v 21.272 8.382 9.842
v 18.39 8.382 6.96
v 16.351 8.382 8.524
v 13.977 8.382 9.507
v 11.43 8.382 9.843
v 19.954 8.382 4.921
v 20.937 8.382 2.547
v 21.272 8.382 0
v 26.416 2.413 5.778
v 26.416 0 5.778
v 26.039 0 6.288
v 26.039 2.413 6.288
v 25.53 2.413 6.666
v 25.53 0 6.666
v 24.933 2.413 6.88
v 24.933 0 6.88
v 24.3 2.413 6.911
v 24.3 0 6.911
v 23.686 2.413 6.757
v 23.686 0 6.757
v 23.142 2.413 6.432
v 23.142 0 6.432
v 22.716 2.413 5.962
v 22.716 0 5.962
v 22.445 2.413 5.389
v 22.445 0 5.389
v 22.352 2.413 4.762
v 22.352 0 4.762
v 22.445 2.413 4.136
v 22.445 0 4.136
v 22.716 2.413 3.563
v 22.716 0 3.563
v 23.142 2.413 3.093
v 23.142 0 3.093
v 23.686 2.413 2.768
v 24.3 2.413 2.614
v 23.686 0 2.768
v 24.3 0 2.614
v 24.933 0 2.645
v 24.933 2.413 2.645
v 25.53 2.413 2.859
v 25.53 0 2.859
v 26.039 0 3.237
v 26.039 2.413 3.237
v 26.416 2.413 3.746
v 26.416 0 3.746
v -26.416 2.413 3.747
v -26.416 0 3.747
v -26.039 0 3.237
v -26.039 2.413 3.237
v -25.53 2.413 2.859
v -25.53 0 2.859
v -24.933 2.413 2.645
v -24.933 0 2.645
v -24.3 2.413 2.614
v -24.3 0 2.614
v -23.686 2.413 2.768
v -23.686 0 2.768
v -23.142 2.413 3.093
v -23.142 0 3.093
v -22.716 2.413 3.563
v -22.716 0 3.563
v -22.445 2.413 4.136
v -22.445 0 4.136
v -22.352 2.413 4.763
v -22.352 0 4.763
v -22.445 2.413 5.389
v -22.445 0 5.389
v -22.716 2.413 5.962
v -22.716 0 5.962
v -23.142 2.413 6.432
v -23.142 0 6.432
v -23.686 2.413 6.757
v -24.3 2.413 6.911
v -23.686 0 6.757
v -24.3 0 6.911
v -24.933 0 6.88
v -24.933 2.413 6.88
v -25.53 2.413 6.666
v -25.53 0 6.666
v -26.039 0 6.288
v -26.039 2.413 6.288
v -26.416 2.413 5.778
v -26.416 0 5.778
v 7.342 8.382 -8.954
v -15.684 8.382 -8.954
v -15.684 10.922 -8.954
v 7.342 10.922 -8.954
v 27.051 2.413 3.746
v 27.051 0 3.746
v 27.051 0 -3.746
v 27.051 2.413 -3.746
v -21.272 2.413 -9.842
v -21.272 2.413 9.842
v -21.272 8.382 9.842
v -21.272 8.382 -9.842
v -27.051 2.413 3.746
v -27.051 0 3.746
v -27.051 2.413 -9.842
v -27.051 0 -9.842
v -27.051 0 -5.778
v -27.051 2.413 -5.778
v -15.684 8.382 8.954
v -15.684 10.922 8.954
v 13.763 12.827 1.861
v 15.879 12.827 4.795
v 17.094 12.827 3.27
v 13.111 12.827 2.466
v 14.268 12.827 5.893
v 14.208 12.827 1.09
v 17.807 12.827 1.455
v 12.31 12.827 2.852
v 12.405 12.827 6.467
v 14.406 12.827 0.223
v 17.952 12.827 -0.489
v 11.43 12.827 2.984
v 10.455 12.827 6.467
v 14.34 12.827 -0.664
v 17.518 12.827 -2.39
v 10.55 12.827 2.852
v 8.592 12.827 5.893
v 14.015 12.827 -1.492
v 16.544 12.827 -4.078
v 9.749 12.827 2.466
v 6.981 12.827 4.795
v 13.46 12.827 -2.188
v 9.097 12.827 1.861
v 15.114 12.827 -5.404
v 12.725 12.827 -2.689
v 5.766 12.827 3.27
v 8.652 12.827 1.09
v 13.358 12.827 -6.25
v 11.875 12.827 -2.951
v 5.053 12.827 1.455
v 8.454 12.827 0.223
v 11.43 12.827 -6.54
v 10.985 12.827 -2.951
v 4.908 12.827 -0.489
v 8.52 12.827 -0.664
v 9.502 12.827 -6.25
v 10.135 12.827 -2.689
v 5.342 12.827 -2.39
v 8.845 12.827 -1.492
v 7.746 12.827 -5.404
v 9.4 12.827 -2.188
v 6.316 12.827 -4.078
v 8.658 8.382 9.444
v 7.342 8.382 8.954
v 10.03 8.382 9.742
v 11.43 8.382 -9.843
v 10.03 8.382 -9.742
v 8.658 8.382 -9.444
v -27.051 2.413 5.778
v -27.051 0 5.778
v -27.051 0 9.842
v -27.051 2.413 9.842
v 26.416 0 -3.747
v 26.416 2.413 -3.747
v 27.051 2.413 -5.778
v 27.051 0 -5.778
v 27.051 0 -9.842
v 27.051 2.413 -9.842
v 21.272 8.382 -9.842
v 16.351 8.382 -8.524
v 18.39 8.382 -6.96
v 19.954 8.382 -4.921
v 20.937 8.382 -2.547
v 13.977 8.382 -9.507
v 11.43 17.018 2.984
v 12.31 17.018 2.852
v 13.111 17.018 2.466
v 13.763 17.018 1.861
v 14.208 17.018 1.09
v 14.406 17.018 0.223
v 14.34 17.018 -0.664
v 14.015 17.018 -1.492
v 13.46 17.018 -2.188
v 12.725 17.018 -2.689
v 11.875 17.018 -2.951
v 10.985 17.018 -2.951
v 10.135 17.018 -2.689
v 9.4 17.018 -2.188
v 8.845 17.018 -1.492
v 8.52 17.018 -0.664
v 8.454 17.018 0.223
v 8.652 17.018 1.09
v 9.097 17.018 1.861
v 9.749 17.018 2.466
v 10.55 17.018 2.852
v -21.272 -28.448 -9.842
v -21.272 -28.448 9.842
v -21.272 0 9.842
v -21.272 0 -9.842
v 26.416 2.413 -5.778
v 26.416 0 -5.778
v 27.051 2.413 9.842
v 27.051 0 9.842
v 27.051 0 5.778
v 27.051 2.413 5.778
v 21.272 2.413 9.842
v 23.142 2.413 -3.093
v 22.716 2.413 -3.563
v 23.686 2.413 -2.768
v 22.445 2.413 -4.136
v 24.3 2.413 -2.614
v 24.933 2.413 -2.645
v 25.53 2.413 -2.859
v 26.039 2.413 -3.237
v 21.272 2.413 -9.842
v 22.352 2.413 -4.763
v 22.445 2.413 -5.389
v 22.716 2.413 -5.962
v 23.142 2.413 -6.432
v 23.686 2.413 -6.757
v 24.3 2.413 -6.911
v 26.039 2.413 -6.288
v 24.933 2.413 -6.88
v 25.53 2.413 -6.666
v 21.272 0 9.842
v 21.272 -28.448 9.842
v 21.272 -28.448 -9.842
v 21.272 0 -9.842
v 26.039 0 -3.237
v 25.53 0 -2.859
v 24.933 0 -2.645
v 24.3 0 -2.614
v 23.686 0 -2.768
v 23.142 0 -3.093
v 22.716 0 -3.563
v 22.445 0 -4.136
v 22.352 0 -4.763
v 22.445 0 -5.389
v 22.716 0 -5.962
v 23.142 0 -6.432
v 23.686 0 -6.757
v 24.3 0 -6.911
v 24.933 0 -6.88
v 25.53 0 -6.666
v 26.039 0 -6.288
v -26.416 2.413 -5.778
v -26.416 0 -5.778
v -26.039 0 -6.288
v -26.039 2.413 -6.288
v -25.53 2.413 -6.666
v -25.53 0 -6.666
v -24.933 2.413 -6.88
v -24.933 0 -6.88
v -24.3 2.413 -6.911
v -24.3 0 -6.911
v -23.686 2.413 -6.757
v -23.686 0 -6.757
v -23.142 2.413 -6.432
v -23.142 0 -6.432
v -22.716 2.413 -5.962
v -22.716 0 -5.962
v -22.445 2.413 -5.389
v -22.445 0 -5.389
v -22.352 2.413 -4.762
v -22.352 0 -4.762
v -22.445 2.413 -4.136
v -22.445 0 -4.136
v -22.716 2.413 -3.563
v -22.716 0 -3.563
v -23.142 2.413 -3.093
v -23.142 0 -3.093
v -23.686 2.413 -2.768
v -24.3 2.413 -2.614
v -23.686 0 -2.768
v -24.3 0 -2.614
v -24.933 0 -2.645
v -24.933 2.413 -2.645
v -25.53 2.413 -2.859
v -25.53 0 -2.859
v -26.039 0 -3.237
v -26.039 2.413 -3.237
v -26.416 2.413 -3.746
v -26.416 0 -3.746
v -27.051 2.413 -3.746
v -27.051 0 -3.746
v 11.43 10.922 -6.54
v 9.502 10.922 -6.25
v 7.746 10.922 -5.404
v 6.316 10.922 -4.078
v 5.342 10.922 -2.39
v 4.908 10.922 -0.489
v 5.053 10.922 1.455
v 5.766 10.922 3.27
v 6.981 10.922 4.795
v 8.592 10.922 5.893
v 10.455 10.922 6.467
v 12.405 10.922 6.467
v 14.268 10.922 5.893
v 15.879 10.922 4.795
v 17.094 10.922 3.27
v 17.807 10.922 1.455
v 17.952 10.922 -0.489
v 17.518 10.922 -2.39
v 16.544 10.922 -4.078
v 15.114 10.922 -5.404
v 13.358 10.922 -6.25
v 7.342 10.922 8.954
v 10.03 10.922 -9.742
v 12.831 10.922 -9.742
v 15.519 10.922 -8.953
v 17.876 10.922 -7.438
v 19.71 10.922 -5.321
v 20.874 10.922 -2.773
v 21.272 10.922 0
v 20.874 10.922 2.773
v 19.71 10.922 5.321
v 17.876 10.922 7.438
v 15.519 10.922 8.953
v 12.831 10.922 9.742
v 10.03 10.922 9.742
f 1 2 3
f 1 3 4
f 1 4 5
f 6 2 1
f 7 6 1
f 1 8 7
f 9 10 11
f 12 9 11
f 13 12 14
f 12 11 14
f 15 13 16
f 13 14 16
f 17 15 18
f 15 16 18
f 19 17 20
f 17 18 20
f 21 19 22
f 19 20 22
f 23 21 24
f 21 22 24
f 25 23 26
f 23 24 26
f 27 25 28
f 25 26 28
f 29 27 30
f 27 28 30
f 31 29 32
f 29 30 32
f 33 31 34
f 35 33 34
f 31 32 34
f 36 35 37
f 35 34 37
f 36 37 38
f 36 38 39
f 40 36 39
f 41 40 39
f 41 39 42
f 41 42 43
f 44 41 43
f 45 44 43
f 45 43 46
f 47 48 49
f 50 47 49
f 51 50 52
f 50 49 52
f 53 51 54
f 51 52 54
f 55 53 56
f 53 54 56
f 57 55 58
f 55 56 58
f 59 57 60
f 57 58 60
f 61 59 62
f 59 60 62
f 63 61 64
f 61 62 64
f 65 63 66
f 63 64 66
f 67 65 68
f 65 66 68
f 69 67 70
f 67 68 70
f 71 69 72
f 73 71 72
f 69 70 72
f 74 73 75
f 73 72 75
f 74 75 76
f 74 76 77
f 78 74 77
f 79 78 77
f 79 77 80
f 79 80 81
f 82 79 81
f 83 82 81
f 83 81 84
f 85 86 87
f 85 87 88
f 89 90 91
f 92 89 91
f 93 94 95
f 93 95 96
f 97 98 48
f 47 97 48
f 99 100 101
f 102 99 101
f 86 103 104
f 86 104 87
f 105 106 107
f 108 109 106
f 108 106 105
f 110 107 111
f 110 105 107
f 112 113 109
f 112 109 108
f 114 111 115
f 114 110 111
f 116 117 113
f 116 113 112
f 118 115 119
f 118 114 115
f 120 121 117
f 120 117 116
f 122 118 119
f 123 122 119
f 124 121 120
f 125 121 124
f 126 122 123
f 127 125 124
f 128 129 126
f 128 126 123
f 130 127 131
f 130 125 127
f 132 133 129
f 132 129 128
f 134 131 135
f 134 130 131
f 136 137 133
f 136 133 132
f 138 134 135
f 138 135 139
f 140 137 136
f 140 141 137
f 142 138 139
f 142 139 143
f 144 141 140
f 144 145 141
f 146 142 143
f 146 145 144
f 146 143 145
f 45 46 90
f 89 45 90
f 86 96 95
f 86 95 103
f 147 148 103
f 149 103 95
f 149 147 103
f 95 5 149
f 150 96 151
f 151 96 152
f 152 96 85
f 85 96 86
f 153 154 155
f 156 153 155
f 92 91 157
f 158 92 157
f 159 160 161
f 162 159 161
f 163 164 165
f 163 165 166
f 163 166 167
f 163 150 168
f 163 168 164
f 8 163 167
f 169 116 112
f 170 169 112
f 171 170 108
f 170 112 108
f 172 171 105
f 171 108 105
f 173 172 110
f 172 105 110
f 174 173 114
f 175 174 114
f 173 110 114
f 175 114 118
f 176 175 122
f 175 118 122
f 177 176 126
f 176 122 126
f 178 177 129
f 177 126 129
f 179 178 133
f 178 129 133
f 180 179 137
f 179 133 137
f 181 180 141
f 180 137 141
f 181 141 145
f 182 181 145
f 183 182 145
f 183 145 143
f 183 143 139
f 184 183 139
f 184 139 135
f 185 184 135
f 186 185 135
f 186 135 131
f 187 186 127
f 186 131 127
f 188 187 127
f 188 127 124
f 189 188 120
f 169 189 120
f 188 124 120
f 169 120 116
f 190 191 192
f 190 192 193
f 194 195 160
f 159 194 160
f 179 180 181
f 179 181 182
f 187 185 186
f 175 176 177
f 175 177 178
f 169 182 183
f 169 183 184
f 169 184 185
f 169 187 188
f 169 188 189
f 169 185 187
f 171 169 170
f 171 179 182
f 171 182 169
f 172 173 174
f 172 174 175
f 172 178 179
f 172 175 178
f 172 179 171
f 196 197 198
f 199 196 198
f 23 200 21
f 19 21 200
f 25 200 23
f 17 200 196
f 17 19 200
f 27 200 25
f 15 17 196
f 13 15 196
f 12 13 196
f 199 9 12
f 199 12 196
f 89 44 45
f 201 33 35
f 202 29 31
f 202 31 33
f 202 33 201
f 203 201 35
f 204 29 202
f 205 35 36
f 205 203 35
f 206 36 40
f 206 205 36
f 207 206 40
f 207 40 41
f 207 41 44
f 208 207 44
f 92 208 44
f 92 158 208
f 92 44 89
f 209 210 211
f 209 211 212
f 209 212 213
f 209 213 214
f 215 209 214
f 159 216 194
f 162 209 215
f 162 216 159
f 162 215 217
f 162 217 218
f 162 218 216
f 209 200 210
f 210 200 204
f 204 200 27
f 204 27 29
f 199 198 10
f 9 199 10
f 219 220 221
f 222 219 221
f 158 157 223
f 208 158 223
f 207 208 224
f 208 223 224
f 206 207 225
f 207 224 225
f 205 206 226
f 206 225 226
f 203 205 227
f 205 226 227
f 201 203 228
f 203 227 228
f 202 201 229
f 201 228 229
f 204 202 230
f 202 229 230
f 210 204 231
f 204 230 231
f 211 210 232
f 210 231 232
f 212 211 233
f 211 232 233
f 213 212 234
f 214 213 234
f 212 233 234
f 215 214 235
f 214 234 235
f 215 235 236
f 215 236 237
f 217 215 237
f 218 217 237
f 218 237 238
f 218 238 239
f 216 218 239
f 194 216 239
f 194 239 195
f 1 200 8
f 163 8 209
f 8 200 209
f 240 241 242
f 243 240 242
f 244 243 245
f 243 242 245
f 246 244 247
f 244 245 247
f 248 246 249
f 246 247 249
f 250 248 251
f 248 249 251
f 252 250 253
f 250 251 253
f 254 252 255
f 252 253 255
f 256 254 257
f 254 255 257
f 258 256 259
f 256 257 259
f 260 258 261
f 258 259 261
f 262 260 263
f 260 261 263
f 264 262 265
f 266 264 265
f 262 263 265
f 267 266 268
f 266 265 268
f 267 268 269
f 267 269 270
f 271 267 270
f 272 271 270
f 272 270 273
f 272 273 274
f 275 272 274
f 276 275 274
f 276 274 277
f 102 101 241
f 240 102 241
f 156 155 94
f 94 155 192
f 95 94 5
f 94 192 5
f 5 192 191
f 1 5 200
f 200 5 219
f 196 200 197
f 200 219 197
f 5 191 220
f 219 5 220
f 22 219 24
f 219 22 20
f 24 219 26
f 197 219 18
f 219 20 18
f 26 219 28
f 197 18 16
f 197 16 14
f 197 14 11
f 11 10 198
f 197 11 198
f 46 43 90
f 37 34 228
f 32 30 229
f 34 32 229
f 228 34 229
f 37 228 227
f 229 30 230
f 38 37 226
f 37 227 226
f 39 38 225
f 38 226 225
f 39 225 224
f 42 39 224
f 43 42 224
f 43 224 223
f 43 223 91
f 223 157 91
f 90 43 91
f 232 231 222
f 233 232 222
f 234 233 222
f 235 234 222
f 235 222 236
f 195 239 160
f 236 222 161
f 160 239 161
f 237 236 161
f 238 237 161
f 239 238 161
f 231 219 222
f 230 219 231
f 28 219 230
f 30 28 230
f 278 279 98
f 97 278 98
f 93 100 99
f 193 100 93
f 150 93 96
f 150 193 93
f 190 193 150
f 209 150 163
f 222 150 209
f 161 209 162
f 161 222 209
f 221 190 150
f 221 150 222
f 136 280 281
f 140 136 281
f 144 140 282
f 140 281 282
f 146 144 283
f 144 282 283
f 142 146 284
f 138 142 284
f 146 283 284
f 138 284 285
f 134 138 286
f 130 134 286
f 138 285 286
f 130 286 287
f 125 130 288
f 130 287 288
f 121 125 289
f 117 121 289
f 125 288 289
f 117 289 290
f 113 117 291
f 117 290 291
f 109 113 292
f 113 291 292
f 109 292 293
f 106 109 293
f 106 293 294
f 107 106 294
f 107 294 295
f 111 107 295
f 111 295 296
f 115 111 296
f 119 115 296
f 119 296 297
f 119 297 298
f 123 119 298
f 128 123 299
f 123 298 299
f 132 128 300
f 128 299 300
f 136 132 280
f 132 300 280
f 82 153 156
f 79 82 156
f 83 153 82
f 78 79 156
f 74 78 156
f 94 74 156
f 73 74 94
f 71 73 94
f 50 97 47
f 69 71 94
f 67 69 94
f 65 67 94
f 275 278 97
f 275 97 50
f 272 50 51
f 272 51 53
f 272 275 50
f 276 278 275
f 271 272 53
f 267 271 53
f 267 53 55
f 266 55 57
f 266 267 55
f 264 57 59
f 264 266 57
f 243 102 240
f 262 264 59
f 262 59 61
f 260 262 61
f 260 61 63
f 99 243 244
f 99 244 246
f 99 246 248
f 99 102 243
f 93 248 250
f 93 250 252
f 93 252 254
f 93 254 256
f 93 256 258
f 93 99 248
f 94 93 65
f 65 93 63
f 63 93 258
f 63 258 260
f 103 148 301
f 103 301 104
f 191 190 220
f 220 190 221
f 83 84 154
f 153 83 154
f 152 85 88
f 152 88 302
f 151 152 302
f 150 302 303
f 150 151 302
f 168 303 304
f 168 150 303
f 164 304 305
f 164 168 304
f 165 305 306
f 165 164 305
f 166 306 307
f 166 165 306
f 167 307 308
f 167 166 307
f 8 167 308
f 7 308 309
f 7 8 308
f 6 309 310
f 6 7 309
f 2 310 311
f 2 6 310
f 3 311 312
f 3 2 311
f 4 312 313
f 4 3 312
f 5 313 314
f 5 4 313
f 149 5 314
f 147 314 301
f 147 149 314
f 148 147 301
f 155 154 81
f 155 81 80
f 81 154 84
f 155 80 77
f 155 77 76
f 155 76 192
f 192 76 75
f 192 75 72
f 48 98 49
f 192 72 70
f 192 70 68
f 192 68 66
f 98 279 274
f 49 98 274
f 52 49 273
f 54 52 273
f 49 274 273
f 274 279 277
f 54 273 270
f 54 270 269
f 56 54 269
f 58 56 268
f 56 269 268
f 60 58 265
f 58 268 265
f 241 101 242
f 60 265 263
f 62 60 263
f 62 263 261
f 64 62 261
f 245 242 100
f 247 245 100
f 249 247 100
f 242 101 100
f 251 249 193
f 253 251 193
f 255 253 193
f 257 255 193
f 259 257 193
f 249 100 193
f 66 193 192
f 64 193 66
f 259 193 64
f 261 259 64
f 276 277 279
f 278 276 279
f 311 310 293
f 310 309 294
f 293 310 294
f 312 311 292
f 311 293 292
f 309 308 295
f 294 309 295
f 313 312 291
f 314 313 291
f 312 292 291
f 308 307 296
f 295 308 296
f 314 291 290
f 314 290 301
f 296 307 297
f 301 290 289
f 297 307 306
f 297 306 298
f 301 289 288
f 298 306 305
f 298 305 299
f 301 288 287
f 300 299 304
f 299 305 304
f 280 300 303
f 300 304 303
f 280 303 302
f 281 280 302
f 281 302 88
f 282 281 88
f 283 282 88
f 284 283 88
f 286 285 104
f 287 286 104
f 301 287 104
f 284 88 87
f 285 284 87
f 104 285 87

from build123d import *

# Parameters (mm, degrees)
BOSS_EXTRUDE1_DEPTH      = 2.413
BOSS_EXTRUDE2_DEPTH      = 8.382
BOSS_EXTRUDE2_DEPTH_BACK = 28.448
SKETCH3_W                = 42.545
SKETCH3_H                = 19.685
BOSS_EXTRUDE3_DEPTH      = 2.54
SKETCH5_R                = 6.5405
BOSS_EXTRUDE4_DEPTH      = 1.905
SKETCH6_R                = 2.9845
BOSS_EXTRUDE5_DEPTH      = 4.191


with BuildPart() as part:
    # Sketch2 → Boss-Extrude1 (new body)
    with BuildSketch(Plane(origin=(0, 0, 0), x_dir=(1, 0, 0), z_dir=(0, 1, 0))):
        with BuildLine():
            Line((-27.051, -9.8425), (27.051, -9.8425))
            Line((27.051, -9.8425), (27.051, -5.7785))
            Line((27.051, -5.7785), (26.416, -5.7785))
            ThreePointArc((26.416, -5.7785), (22.352, -4.7625), (26.416, -3.7465))
            Line((26.416, -3.7465), (27.051, -3.7465))
            Line((27.051, -3.7465), (27.051, 3.7465))
            Line((27.051, 3.7465), (26.416, 3.7465))
            ThreePointArc((26.416, 3.7465), (22.352, 4.7625), (26.416, 5.7785))
            Line((26.416, 5.7785), (27.051, 5.7785))
            Line((27.051, 5.7785), (27.051, 9.8425))
            Line((27.051, 9.8425), (-27.051, 9.8425))
            Line((-27.051, 9.8425), (-27.051, 5.7785))
            Line((-27.051, 5.7785), (-26.416, 5.7785))
            ThreePointArc((-26.416, 5.7785), (-22.352, 4.7625), (-26.416, 3.7465))
            Line((-26.416, 3.7465), (-27.051, 3.7465))
            Line((-27.051, 3.7465), (-27.051, -3.7465))
            Line((-27.051, -3.7465), (-26.416, -3.7465))
            ThreePointArc((-26.416, -3.7465), (-22.352, -4.7625), (-26.416, -5.7785))
            Line((-26.416, -5.7785), (-27.051, -5.7785))
            Line((-27.051, -5.7785), (-27.051, -9.8425))
        make_face()
    extrude(amount=BOSS_EXTRUDE1_DEPTH)

    # Sketch3 → Boss-Extrude2 (add, two sides: drawn at the far end of the back side and taken through both)
    with BuildSketch(Plane(origin=(0, 0, 0), x_dir=(1, 0, 0), z_dir=(0, 1, 0)).offset(-BOSS_EXTRUDE2_DEPTH_BACK)):
        Rectangle(SKETCH3_W, SKETCH3_H)
    extrude(amount=BOSS_EXTRUDE2_DEPTH + BOSS_EXTRUDE2_DEPTH_BACK)

    # Sketch4 → Boss-Extrude3 (add)
    with BuildSketch(Plane(origin=(0, 8.382, 0), x_dir=(1, 0, 0), z_dir=(0, 1, 0))):
        with BuildLine():
            Line((-15.6845, 8.9535), (7.342256857, 8.9535))
            ThreePointArc((7.342256857, 8.9535), (21.2725, 0), (7.342256857, -8.9535))
            Line((7.342256857, -8.9535), (-15.6845, -8.9535))
            Line((-15.6845, -8.9535), (-15.6845, 8.9535))
        make_face()
    extrude(amount=BOSS_EXTRUDE3_DEPTH)

    # Sketch5 → Boss-Extrude4 (add)
    with BuildSketch(Plane(origin=(0, 10.922, 0), x_dir=(1, 0, 0), z_dir=(0, 1, 0))):
        with Locations(Location((11.43, 0, 0), (0, 0, 90))):
            Circle(SKETCH5_R)
    extrude(amount=BOSS_EXTRUDE4_DEPTH)

    # Sketch6 → Boss-Extrude5 (add)
    with BuildSketch(Plane(origin=(0, 12.827, 0), x_dir=(1, 0, 0), z_dir=(0, 1, 0))):
        with Locations(Location((11.43, 0, 0), (0, 0, 270))):
            Circle(SKETCH6_R)
    extrude(amount=BOSS_EXTRUDE5_DEPTH)


solid = part.part
